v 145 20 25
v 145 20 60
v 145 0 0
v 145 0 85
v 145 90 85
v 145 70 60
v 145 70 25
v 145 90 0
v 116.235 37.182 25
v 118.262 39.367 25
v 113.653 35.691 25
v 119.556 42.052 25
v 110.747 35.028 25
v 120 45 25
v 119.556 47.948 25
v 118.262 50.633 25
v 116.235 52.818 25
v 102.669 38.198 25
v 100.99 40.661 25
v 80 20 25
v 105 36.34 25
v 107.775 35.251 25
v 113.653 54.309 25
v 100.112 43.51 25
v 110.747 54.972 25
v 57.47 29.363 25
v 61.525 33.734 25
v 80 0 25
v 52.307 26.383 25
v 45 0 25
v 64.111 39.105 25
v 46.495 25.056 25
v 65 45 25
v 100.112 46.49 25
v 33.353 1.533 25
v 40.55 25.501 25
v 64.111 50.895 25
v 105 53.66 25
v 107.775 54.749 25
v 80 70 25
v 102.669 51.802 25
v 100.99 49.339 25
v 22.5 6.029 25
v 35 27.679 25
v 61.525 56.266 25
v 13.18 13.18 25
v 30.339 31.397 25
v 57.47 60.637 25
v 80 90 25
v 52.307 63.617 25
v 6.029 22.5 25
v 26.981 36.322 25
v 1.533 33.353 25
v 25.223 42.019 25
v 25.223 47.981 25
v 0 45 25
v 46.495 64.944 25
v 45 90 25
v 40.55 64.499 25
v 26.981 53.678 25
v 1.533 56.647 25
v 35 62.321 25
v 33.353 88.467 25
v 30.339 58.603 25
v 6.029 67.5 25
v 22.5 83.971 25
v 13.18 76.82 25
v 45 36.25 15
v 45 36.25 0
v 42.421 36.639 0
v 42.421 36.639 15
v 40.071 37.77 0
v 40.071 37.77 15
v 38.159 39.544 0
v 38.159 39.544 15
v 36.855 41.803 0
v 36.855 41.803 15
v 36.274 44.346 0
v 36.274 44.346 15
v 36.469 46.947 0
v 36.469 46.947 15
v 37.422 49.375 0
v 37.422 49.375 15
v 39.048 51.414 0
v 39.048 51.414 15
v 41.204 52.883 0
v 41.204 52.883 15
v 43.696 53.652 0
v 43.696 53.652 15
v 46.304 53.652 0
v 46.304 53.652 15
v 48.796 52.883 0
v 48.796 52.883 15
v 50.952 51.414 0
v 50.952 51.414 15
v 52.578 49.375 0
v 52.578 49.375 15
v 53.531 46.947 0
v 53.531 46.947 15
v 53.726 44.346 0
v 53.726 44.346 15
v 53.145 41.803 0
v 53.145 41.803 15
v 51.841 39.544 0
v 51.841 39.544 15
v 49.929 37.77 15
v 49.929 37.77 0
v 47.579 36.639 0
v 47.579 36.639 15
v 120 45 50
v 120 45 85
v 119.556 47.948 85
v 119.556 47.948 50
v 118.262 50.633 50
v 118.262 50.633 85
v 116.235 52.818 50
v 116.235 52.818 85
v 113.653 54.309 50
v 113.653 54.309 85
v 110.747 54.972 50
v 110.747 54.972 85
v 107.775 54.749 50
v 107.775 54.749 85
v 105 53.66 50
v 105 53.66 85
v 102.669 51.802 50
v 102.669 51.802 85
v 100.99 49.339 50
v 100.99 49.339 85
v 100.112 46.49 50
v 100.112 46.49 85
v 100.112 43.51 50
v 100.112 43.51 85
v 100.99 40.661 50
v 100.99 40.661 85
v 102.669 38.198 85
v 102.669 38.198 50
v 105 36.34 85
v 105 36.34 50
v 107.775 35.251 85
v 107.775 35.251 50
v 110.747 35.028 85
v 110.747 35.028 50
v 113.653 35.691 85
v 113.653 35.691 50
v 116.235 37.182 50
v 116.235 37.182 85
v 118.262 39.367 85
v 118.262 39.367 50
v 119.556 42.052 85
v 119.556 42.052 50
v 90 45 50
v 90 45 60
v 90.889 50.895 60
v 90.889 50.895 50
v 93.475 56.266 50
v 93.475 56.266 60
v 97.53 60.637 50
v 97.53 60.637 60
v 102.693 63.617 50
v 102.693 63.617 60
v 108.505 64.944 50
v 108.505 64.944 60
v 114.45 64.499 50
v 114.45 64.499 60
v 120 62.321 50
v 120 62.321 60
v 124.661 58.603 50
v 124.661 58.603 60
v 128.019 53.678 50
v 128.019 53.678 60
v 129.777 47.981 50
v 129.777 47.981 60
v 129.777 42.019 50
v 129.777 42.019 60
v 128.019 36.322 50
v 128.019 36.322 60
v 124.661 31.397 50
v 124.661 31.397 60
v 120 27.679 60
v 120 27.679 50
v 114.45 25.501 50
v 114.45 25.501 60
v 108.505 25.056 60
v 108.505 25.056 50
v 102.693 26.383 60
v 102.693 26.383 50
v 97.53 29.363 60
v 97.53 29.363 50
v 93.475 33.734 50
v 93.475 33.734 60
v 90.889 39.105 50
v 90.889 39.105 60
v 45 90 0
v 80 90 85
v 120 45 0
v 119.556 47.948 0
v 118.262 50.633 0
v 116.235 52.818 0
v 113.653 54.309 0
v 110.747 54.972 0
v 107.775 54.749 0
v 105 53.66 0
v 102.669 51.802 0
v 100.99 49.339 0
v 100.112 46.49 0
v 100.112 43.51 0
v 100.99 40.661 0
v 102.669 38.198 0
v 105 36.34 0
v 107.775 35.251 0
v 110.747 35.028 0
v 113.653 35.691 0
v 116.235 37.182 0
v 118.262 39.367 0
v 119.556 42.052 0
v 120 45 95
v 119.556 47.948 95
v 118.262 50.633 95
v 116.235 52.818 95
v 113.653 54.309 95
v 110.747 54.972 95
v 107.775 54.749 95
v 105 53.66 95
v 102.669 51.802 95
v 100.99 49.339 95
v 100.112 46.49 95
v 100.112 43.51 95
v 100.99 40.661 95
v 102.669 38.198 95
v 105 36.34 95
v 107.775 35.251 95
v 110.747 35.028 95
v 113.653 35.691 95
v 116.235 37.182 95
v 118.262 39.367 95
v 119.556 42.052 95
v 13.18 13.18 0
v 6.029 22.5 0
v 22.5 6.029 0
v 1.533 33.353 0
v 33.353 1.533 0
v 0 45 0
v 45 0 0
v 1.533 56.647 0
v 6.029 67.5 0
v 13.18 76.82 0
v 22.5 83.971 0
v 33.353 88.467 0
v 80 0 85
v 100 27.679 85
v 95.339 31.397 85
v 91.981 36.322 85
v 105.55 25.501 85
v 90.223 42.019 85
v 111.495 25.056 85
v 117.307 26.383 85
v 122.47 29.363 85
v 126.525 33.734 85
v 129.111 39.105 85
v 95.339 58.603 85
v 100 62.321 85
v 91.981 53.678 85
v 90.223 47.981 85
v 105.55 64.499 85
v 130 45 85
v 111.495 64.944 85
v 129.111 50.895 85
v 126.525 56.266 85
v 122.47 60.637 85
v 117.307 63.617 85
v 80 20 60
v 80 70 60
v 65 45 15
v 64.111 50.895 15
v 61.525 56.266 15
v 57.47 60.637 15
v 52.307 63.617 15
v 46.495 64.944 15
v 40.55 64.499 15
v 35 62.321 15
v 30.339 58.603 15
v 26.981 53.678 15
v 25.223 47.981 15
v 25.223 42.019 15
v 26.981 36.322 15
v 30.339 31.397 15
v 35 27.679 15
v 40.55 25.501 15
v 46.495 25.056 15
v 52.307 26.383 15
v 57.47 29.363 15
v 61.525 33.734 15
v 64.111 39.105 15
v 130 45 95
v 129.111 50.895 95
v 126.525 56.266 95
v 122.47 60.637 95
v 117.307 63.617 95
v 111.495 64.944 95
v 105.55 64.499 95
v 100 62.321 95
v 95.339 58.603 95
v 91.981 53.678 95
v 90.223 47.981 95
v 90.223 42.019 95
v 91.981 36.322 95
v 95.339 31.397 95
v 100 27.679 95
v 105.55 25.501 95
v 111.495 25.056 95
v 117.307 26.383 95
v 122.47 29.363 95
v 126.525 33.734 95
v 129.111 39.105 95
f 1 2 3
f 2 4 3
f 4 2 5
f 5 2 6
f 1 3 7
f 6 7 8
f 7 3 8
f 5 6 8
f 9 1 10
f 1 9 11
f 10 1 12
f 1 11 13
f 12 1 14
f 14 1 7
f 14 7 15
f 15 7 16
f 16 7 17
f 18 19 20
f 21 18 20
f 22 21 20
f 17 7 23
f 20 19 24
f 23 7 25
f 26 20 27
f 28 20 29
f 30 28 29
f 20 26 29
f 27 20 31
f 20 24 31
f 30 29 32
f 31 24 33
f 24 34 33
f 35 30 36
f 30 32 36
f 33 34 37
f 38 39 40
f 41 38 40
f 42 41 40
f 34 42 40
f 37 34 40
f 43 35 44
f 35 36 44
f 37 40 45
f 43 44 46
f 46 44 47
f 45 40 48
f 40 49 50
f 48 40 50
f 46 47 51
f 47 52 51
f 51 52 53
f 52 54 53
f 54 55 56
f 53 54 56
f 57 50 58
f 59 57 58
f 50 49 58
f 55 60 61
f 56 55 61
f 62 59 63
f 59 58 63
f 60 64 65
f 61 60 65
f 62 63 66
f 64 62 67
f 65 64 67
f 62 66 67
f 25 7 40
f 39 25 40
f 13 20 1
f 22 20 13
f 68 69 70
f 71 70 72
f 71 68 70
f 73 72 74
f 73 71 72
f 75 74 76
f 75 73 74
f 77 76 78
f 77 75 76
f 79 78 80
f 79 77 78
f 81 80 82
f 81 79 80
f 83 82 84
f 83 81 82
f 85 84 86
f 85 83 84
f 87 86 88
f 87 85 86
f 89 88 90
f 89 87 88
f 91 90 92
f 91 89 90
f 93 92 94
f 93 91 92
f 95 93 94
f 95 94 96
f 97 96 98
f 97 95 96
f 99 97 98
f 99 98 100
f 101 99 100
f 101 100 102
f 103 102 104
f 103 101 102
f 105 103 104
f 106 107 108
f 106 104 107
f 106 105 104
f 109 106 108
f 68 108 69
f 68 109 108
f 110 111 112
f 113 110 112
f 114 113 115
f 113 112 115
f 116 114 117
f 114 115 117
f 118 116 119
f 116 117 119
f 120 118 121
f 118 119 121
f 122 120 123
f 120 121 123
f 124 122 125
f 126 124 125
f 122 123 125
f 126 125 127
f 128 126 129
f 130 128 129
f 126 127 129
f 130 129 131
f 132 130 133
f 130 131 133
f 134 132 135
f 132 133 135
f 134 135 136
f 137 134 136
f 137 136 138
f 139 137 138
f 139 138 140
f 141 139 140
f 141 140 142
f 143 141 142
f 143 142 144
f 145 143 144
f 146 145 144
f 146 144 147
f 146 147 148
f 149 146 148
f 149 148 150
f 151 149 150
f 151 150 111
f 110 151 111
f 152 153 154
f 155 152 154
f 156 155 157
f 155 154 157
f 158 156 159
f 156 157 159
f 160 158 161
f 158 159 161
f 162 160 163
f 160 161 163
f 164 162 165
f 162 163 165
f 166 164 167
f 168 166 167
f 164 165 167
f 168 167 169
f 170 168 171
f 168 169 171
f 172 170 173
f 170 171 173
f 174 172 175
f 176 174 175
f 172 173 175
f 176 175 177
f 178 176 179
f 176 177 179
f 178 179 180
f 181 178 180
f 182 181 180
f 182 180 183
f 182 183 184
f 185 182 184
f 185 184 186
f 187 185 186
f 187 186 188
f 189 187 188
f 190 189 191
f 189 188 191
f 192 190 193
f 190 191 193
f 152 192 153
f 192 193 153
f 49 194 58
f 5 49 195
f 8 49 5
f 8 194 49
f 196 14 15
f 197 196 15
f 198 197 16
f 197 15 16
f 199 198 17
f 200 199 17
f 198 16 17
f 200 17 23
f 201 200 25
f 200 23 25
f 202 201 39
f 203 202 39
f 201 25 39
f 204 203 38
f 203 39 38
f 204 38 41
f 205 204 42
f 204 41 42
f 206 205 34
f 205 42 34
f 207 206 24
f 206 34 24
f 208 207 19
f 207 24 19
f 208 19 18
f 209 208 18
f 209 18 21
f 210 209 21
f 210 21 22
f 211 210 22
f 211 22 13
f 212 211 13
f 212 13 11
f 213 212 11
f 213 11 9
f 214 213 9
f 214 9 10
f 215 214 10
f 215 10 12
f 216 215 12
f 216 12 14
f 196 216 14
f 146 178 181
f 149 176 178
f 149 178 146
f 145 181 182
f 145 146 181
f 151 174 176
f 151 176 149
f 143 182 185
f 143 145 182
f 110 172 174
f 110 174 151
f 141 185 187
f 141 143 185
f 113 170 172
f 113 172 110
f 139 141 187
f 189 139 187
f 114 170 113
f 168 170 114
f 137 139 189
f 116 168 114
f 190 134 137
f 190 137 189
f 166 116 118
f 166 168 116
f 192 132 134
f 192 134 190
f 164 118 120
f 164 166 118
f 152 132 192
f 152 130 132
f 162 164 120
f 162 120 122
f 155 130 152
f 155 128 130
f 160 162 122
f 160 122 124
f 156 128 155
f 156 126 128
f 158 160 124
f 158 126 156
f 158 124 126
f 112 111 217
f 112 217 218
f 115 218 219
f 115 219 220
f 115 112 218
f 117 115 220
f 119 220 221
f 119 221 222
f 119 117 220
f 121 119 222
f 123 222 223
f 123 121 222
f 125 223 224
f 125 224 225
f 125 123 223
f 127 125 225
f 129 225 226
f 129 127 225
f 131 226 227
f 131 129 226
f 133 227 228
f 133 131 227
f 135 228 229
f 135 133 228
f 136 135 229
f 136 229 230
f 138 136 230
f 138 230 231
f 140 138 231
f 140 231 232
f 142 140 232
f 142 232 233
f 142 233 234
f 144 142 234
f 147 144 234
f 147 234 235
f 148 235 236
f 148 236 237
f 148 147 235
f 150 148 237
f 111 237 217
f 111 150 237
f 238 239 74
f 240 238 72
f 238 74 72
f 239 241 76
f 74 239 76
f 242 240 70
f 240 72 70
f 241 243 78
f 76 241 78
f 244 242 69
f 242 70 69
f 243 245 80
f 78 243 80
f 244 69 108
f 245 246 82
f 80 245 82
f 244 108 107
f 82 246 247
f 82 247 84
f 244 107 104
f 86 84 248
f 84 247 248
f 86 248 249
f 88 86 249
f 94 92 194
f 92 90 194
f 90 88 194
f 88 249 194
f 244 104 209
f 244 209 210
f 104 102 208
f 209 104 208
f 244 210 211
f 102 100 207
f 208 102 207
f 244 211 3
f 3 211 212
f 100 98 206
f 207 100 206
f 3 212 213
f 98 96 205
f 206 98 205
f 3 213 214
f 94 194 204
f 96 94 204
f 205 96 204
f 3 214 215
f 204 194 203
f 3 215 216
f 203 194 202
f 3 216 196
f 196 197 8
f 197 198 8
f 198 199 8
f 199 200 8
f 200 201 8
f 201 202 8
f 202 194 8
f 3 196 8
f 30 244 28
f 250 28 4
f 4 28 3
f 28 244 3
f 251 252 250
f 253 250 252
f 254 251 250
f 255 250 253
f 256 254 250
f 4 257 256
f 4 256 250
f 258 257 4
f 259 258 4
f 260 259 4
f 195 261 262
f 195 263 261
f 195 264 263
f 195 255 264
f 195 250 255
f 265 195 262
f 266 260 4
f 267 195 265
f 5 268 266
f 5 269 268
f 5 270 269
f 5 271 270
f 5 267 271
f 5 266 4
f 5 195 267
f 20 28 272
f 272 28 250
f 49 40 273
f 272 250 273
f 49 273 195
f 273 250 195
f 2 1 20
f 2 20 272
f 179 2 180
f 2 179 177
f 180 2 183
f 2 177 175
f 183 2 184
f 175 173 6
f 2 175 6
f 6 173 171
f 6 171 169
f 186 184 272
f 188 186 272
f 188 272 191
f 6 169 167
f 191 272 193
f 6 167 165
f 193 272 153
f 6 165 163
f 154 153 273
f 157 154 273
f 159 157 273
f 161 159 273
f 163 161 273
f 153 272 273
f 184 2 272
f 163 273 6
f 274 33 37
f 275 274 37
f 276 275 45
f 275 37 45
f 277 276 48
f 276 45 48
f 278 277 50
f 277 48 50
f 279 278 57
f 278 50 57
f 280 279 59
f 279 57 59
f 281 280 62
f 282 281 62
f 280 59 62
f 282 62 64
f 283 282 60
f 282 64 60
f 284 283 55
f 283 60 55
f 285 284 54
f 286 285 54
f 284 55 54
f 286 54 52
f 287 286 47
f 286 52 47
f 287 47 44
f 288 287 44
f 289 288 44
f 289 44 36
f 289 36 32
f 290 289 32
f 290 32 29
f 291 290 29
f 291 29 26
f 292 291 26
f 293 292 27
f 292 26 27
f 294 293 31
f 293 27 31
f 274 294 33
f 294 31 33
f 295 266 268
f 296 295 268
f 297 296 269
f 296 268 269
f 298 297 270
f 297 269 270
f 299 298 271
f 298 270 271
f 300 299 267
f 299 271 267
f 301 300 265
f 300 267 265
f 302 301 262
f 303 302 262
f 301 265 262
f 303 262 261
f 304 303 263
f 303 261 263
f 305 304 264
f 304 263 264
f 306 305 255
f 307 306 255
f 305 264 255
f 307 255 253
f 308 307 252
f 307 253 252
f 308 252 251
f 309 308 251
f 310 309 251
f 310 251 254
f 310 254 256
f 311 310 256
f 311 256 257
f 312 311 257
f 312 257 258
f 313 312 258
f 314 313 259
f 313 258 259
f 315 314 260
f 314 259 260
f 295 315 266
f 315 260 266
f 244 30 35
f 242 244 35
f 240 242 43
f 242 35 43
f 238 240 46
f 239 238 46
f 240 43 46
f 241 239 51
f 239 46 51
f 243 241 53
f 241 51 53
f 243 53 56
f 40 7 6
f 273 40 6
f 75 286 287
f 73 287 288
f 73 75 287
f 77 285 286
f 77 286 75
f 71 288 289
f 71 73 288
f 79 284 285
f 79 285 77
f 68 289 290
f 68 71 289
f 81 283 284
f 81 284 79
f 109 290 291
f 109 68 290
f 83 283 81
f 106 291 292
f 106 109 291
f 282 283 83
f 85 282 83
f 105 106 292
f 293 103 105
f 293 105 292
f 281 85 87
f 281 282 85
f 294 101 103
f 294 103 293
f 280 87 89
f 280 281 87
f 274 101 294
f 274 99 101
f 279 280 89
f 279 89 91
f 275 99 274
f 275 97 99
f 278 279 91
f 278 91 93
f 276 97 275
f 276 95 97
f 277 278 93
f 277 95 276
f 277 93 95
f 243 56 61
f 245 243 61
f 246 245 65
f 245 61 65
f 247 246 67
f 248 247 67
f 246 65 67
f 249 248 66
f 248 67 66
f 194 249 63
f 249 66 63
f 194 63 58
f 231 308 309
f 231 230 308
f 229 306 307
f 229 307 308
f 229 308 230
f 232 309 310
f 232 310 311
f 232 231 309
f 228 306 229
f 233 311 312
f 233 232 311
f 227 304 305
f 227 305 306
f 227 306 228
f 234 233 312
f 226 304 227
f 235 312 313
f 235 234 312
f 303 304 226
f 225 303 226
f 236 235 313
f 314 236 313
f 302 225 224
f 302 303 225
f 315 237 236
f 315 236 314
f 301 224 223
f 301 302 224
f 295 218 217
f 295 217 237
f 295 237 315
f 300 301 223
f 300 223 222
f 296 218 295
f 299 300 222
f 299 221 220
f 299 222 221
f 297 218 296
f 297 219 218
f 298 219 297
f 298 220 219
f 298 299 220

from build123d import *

# Parameters (mm, degrees)
SKETCH1_W                   = 145
SKETCH1_H                   = 90
BOSS_EXTRUDE1_DEPTH         = 85
CUT_EXTRUDE1_DEPTH          = 85
CUT_EXTRUDE3_DEPTH          = 50
M20_TAPPED_HOLE1_AT_2_COUNT = 2
M20_TAPPED_HOLE1_AT_2_PITCH = 65
M20_TAPPED_HOLE3_D          = 17.5
M20_TAPPED_HOLE3_DEPTH      = 60
M20_TAPPED_HOLE3_TIP        = 5.257530416
SKETCH12_R                  = 20
SKETCH12_R_2                = 10
CUT_EXTRUDE4_DEPTH          = 10
SKETCH13_R                  = 10
SKETCH13_R_2                = 8.75
CUT_EXTRUDE5_DEPTH          = 10
CUT_EXTRUDE6_DEPTH          = 10
SKETCH15_R                  = 20
SKETCH15_R_2                = 10
CUT_EXTRUDE7_DEPTH          = 10
SKETCH16_R                  = 10
SKETCH16_R_2                = 8.75
CUT_EXTRUDE8_DEPTH          = 10
SKETCH17_W                  = 35
SKETCH17_H                  = 50
CUT_EXTRUDE9_DEPTH          = 97
SKETCH18_R                  = 20
SKETCH18_R_2                = 10
BOSS_EXTRUDE2_DEPTH         = 10
SKETCH19_R                  = 20
SKETCH19_R_2                = 8.75
BOSS_EXTRUDE3_DEPTH         = 10
SKETCH20_R                  = 10
SKETCH20_R_2                = 8.75
CUT_EXTRUDE10_DEPTH         = 120


with BuildPart() as part:
    # Sketch1 → Boss-Extrude1 (new body)
    with BuildSketch(Plane.XY):
        with Locations((72.5, 45)):
            Rectangle(SKETCH1_W, SKETCH1_H)
    extrude(amount=BOSS_EXTRUDE1_DEPTH)

    # Sketch2 → Cut-Extrude1 (cut)
    with BuildSketch(Plane.XY.offset(85)):
        with BuildLine():
            ThreePointArc((0, 45), (13.180194847, 76.819805153), (45, 90))
            Line((45, 90), (0, 90))
            Line((0, 90), (0, 45))
        make_face()
        with BuildLine():
            ThreePointArc((45, 0), (13.180194847, 13.180194847), (0, 45))
            Line((0, 45), (0, 0))
            Line((0, 0), (45, 0))
        make_face()
    extrude(amount=-CUT_EXTRUDE1_DEPTH, mode=Mode.SUBTRACT)

    # Sketch4 → Cut-Extrude3 (cut)
    with BuildSketch(Plane.XY.offset(85)):
        with BuildLine():
            Line((80, 0), (80, 90))
            Line((80, 90), (45, 90))
            ThreePointArc((45, 90), (0, 45), (45, 0))
            Line((45, 0), (80, 0))
        make_face()
    extrude(amount=-CUT_EXTRUDE3_DEPTH, mode=Mode.SUBTRACT)

    # Sketch6 → M20 Tapped Hole1 (revolve, cut)
    with BuildSketch(Plane(origin=(45, 45, 35), x_dir=(0, -1, 0), z_dir=(1, 0, 0))):
        Polygon((0, 0), (0, 45.257530416), (8.75, 40), (8.75, 0), align=None)
    m20_tapped_hole1 = revolve(axis=Axis((45, 45, 41.35), (0, 0, -1)), mode=Mode.SUBTRACT)

    # M20 Tapped Hole1 at 2: M20 Tapped Hole1 ×2
    with Locations(*[(i * M20_TAPPED_HOLE1_AT_2_PITCH, 0, 0) for i in range(1, M20_TAPPED_HOLE1_AT_2_COUNT)]):
        add(m20_tapped_hole1, mode=Mode.SUBTRACT)

    # M20 Tapped Hole3
    with Locations(Plane(origin=(110, 45, 85), x_dir=(1, 0, 0), z_dir=(0, 0, 1))):
        with Locations((0, 0)):
            Hole(M20_TAPPED_HOLE3_D / 2, depth=M20_TAPPED_HOLE3_DEPTH)
            with Locations((0, 0, -(M20_TAPPED_HOLE3_DEPTH + M20_TAPPED_HOLE3_TIP / 2))):  # 118° drill point
                Cone(0, M20_TAPPED_HOLE3_D / 2, M20_TAPPED_HOLE3_TIP, mode=Mode.SUBTRACT)

    # Sketch12 → Cut-Extrude4 (cut)
    with BuildSketch(Plane.XY.offset(35)):
        with Locations((45, 45)):
            Circle(SKETCH12_R)
        with Locations((45, 45)):
            Circle(SKETCH12_R_2, mode=Mode.SUBTRACT)
    extrude(amount=-CUT_EXTRUDE4_DEPTH, mode=Mode.SUBTRACT)

    # Sketch13 → Cut-Extrude5 (cut)
    with BuildSketch(Plane.XY.offset(35)):
        with Locations((45, 45)):
            Circle(SKETCH13_R)
        with Locations((45, 45)):
            Circle(SKETCH13_R_2, mode=Mode.SUBTRACT)
    extrude(amount=-CUT_EXTRUDE5_DEPTH, mode=Mode.SUBTRACT)

    # Sketch14 → Cut-Extrude6 (cut)
    with BuildSketch(Plane.XY.offset(35)):
        with BuildLine():
            Line((80, 90), (80, 0))
            Line((80, 0), (45, 0))
            ThreePointArc((45, 0), (0, 45), (45, 90))
            Line((45, 90), (80, 90))
        make_face()
    extrude(amount=-CUT_EXTRUDE6_DEPTH, mode=Mode.SUBTRACT)

    # Sketch15 → Cut-Extrude7 (cut)
    with BuildSketch(Plane.XY.offset(25)):
        with Locations((45, 45)):
            Circle(SKETCH15_R)
        with Locations((45, 45)):
            Circle(SKETCH15_R_2, mode=Mode.SUBTRACT)
    extrude(amount=-CUT_EXTRUDE7_DEPTH, mode=Mode.SUBTRACT)

    # Sketch16 → Cut-Extrude8 (cut)
    with BuildSketch(Plane.XY.offset(25)):
        with Locations((45, 45)):
            Circle(SKETCH16_R)
        with Locations((45, 45)):
            Circle(SKETCH16_R_2, mode=Mode.SUBTRACT)
    extrude(amount=-CUT_EXTRUDE8_DEPTH, mode=Mode.SUBTRACT)

    # Sketch17 → Cut-Extrude9 (cut)
    with BuildSketch(Plane.ZY.offset(-80)):
        with Locations((42.5, 45)):
            Rectangle(SKETCH17_W, SKETCH17_H)
    extrude(amount=-CUT_EXTRUDE9_DEPTH, mode=Mode.SUBTRACT)

    # Sketch18 → Boss-Extrude2 (add)
    with BuildSketch(Plane.XY.offset(85)):
        with Locations((110, 45)):
            Circle(SKETCH18_R)
        with Locations((110, 45)):
            Circle(SKETCH18_R_2, mode=Mode.SUBTRACT)
    extrude(amount=BOSS_EXTRUDE2_DEPTH)

    # Sketch19 → Boss-Extrude3 (add)
    with BuildSketch(Plane(origin=(0, 0, 60), x_dir=(-1, 0, 0), z_dir=(0, 0, -1))):
        with Locations((-110, 45)):
            Circle(SKETCH19_R)
        with Locations((-110, 45)):
            Circle(SKETCH19_R_2, mode=Mode.SUBTRACT)
    extrude(amount=BOSS_EXTRUDE3_DEPTH)

    # Sketch20 → Cut-Extrude10 (cut)
    with BuildSketch(Plane.XY.offset(85)):
        with Locations((110, 45)):
            Circle(SKETCH20_R)
        with Locations((110, 45)):
            Circle(SKETCH20_R_2, mode=Mode.SUBTRACT)
    extrude(amount=-CUT_EXTRUDE10_DEPTH, mode=Mode.SUBTRACT)


solid = part.part
